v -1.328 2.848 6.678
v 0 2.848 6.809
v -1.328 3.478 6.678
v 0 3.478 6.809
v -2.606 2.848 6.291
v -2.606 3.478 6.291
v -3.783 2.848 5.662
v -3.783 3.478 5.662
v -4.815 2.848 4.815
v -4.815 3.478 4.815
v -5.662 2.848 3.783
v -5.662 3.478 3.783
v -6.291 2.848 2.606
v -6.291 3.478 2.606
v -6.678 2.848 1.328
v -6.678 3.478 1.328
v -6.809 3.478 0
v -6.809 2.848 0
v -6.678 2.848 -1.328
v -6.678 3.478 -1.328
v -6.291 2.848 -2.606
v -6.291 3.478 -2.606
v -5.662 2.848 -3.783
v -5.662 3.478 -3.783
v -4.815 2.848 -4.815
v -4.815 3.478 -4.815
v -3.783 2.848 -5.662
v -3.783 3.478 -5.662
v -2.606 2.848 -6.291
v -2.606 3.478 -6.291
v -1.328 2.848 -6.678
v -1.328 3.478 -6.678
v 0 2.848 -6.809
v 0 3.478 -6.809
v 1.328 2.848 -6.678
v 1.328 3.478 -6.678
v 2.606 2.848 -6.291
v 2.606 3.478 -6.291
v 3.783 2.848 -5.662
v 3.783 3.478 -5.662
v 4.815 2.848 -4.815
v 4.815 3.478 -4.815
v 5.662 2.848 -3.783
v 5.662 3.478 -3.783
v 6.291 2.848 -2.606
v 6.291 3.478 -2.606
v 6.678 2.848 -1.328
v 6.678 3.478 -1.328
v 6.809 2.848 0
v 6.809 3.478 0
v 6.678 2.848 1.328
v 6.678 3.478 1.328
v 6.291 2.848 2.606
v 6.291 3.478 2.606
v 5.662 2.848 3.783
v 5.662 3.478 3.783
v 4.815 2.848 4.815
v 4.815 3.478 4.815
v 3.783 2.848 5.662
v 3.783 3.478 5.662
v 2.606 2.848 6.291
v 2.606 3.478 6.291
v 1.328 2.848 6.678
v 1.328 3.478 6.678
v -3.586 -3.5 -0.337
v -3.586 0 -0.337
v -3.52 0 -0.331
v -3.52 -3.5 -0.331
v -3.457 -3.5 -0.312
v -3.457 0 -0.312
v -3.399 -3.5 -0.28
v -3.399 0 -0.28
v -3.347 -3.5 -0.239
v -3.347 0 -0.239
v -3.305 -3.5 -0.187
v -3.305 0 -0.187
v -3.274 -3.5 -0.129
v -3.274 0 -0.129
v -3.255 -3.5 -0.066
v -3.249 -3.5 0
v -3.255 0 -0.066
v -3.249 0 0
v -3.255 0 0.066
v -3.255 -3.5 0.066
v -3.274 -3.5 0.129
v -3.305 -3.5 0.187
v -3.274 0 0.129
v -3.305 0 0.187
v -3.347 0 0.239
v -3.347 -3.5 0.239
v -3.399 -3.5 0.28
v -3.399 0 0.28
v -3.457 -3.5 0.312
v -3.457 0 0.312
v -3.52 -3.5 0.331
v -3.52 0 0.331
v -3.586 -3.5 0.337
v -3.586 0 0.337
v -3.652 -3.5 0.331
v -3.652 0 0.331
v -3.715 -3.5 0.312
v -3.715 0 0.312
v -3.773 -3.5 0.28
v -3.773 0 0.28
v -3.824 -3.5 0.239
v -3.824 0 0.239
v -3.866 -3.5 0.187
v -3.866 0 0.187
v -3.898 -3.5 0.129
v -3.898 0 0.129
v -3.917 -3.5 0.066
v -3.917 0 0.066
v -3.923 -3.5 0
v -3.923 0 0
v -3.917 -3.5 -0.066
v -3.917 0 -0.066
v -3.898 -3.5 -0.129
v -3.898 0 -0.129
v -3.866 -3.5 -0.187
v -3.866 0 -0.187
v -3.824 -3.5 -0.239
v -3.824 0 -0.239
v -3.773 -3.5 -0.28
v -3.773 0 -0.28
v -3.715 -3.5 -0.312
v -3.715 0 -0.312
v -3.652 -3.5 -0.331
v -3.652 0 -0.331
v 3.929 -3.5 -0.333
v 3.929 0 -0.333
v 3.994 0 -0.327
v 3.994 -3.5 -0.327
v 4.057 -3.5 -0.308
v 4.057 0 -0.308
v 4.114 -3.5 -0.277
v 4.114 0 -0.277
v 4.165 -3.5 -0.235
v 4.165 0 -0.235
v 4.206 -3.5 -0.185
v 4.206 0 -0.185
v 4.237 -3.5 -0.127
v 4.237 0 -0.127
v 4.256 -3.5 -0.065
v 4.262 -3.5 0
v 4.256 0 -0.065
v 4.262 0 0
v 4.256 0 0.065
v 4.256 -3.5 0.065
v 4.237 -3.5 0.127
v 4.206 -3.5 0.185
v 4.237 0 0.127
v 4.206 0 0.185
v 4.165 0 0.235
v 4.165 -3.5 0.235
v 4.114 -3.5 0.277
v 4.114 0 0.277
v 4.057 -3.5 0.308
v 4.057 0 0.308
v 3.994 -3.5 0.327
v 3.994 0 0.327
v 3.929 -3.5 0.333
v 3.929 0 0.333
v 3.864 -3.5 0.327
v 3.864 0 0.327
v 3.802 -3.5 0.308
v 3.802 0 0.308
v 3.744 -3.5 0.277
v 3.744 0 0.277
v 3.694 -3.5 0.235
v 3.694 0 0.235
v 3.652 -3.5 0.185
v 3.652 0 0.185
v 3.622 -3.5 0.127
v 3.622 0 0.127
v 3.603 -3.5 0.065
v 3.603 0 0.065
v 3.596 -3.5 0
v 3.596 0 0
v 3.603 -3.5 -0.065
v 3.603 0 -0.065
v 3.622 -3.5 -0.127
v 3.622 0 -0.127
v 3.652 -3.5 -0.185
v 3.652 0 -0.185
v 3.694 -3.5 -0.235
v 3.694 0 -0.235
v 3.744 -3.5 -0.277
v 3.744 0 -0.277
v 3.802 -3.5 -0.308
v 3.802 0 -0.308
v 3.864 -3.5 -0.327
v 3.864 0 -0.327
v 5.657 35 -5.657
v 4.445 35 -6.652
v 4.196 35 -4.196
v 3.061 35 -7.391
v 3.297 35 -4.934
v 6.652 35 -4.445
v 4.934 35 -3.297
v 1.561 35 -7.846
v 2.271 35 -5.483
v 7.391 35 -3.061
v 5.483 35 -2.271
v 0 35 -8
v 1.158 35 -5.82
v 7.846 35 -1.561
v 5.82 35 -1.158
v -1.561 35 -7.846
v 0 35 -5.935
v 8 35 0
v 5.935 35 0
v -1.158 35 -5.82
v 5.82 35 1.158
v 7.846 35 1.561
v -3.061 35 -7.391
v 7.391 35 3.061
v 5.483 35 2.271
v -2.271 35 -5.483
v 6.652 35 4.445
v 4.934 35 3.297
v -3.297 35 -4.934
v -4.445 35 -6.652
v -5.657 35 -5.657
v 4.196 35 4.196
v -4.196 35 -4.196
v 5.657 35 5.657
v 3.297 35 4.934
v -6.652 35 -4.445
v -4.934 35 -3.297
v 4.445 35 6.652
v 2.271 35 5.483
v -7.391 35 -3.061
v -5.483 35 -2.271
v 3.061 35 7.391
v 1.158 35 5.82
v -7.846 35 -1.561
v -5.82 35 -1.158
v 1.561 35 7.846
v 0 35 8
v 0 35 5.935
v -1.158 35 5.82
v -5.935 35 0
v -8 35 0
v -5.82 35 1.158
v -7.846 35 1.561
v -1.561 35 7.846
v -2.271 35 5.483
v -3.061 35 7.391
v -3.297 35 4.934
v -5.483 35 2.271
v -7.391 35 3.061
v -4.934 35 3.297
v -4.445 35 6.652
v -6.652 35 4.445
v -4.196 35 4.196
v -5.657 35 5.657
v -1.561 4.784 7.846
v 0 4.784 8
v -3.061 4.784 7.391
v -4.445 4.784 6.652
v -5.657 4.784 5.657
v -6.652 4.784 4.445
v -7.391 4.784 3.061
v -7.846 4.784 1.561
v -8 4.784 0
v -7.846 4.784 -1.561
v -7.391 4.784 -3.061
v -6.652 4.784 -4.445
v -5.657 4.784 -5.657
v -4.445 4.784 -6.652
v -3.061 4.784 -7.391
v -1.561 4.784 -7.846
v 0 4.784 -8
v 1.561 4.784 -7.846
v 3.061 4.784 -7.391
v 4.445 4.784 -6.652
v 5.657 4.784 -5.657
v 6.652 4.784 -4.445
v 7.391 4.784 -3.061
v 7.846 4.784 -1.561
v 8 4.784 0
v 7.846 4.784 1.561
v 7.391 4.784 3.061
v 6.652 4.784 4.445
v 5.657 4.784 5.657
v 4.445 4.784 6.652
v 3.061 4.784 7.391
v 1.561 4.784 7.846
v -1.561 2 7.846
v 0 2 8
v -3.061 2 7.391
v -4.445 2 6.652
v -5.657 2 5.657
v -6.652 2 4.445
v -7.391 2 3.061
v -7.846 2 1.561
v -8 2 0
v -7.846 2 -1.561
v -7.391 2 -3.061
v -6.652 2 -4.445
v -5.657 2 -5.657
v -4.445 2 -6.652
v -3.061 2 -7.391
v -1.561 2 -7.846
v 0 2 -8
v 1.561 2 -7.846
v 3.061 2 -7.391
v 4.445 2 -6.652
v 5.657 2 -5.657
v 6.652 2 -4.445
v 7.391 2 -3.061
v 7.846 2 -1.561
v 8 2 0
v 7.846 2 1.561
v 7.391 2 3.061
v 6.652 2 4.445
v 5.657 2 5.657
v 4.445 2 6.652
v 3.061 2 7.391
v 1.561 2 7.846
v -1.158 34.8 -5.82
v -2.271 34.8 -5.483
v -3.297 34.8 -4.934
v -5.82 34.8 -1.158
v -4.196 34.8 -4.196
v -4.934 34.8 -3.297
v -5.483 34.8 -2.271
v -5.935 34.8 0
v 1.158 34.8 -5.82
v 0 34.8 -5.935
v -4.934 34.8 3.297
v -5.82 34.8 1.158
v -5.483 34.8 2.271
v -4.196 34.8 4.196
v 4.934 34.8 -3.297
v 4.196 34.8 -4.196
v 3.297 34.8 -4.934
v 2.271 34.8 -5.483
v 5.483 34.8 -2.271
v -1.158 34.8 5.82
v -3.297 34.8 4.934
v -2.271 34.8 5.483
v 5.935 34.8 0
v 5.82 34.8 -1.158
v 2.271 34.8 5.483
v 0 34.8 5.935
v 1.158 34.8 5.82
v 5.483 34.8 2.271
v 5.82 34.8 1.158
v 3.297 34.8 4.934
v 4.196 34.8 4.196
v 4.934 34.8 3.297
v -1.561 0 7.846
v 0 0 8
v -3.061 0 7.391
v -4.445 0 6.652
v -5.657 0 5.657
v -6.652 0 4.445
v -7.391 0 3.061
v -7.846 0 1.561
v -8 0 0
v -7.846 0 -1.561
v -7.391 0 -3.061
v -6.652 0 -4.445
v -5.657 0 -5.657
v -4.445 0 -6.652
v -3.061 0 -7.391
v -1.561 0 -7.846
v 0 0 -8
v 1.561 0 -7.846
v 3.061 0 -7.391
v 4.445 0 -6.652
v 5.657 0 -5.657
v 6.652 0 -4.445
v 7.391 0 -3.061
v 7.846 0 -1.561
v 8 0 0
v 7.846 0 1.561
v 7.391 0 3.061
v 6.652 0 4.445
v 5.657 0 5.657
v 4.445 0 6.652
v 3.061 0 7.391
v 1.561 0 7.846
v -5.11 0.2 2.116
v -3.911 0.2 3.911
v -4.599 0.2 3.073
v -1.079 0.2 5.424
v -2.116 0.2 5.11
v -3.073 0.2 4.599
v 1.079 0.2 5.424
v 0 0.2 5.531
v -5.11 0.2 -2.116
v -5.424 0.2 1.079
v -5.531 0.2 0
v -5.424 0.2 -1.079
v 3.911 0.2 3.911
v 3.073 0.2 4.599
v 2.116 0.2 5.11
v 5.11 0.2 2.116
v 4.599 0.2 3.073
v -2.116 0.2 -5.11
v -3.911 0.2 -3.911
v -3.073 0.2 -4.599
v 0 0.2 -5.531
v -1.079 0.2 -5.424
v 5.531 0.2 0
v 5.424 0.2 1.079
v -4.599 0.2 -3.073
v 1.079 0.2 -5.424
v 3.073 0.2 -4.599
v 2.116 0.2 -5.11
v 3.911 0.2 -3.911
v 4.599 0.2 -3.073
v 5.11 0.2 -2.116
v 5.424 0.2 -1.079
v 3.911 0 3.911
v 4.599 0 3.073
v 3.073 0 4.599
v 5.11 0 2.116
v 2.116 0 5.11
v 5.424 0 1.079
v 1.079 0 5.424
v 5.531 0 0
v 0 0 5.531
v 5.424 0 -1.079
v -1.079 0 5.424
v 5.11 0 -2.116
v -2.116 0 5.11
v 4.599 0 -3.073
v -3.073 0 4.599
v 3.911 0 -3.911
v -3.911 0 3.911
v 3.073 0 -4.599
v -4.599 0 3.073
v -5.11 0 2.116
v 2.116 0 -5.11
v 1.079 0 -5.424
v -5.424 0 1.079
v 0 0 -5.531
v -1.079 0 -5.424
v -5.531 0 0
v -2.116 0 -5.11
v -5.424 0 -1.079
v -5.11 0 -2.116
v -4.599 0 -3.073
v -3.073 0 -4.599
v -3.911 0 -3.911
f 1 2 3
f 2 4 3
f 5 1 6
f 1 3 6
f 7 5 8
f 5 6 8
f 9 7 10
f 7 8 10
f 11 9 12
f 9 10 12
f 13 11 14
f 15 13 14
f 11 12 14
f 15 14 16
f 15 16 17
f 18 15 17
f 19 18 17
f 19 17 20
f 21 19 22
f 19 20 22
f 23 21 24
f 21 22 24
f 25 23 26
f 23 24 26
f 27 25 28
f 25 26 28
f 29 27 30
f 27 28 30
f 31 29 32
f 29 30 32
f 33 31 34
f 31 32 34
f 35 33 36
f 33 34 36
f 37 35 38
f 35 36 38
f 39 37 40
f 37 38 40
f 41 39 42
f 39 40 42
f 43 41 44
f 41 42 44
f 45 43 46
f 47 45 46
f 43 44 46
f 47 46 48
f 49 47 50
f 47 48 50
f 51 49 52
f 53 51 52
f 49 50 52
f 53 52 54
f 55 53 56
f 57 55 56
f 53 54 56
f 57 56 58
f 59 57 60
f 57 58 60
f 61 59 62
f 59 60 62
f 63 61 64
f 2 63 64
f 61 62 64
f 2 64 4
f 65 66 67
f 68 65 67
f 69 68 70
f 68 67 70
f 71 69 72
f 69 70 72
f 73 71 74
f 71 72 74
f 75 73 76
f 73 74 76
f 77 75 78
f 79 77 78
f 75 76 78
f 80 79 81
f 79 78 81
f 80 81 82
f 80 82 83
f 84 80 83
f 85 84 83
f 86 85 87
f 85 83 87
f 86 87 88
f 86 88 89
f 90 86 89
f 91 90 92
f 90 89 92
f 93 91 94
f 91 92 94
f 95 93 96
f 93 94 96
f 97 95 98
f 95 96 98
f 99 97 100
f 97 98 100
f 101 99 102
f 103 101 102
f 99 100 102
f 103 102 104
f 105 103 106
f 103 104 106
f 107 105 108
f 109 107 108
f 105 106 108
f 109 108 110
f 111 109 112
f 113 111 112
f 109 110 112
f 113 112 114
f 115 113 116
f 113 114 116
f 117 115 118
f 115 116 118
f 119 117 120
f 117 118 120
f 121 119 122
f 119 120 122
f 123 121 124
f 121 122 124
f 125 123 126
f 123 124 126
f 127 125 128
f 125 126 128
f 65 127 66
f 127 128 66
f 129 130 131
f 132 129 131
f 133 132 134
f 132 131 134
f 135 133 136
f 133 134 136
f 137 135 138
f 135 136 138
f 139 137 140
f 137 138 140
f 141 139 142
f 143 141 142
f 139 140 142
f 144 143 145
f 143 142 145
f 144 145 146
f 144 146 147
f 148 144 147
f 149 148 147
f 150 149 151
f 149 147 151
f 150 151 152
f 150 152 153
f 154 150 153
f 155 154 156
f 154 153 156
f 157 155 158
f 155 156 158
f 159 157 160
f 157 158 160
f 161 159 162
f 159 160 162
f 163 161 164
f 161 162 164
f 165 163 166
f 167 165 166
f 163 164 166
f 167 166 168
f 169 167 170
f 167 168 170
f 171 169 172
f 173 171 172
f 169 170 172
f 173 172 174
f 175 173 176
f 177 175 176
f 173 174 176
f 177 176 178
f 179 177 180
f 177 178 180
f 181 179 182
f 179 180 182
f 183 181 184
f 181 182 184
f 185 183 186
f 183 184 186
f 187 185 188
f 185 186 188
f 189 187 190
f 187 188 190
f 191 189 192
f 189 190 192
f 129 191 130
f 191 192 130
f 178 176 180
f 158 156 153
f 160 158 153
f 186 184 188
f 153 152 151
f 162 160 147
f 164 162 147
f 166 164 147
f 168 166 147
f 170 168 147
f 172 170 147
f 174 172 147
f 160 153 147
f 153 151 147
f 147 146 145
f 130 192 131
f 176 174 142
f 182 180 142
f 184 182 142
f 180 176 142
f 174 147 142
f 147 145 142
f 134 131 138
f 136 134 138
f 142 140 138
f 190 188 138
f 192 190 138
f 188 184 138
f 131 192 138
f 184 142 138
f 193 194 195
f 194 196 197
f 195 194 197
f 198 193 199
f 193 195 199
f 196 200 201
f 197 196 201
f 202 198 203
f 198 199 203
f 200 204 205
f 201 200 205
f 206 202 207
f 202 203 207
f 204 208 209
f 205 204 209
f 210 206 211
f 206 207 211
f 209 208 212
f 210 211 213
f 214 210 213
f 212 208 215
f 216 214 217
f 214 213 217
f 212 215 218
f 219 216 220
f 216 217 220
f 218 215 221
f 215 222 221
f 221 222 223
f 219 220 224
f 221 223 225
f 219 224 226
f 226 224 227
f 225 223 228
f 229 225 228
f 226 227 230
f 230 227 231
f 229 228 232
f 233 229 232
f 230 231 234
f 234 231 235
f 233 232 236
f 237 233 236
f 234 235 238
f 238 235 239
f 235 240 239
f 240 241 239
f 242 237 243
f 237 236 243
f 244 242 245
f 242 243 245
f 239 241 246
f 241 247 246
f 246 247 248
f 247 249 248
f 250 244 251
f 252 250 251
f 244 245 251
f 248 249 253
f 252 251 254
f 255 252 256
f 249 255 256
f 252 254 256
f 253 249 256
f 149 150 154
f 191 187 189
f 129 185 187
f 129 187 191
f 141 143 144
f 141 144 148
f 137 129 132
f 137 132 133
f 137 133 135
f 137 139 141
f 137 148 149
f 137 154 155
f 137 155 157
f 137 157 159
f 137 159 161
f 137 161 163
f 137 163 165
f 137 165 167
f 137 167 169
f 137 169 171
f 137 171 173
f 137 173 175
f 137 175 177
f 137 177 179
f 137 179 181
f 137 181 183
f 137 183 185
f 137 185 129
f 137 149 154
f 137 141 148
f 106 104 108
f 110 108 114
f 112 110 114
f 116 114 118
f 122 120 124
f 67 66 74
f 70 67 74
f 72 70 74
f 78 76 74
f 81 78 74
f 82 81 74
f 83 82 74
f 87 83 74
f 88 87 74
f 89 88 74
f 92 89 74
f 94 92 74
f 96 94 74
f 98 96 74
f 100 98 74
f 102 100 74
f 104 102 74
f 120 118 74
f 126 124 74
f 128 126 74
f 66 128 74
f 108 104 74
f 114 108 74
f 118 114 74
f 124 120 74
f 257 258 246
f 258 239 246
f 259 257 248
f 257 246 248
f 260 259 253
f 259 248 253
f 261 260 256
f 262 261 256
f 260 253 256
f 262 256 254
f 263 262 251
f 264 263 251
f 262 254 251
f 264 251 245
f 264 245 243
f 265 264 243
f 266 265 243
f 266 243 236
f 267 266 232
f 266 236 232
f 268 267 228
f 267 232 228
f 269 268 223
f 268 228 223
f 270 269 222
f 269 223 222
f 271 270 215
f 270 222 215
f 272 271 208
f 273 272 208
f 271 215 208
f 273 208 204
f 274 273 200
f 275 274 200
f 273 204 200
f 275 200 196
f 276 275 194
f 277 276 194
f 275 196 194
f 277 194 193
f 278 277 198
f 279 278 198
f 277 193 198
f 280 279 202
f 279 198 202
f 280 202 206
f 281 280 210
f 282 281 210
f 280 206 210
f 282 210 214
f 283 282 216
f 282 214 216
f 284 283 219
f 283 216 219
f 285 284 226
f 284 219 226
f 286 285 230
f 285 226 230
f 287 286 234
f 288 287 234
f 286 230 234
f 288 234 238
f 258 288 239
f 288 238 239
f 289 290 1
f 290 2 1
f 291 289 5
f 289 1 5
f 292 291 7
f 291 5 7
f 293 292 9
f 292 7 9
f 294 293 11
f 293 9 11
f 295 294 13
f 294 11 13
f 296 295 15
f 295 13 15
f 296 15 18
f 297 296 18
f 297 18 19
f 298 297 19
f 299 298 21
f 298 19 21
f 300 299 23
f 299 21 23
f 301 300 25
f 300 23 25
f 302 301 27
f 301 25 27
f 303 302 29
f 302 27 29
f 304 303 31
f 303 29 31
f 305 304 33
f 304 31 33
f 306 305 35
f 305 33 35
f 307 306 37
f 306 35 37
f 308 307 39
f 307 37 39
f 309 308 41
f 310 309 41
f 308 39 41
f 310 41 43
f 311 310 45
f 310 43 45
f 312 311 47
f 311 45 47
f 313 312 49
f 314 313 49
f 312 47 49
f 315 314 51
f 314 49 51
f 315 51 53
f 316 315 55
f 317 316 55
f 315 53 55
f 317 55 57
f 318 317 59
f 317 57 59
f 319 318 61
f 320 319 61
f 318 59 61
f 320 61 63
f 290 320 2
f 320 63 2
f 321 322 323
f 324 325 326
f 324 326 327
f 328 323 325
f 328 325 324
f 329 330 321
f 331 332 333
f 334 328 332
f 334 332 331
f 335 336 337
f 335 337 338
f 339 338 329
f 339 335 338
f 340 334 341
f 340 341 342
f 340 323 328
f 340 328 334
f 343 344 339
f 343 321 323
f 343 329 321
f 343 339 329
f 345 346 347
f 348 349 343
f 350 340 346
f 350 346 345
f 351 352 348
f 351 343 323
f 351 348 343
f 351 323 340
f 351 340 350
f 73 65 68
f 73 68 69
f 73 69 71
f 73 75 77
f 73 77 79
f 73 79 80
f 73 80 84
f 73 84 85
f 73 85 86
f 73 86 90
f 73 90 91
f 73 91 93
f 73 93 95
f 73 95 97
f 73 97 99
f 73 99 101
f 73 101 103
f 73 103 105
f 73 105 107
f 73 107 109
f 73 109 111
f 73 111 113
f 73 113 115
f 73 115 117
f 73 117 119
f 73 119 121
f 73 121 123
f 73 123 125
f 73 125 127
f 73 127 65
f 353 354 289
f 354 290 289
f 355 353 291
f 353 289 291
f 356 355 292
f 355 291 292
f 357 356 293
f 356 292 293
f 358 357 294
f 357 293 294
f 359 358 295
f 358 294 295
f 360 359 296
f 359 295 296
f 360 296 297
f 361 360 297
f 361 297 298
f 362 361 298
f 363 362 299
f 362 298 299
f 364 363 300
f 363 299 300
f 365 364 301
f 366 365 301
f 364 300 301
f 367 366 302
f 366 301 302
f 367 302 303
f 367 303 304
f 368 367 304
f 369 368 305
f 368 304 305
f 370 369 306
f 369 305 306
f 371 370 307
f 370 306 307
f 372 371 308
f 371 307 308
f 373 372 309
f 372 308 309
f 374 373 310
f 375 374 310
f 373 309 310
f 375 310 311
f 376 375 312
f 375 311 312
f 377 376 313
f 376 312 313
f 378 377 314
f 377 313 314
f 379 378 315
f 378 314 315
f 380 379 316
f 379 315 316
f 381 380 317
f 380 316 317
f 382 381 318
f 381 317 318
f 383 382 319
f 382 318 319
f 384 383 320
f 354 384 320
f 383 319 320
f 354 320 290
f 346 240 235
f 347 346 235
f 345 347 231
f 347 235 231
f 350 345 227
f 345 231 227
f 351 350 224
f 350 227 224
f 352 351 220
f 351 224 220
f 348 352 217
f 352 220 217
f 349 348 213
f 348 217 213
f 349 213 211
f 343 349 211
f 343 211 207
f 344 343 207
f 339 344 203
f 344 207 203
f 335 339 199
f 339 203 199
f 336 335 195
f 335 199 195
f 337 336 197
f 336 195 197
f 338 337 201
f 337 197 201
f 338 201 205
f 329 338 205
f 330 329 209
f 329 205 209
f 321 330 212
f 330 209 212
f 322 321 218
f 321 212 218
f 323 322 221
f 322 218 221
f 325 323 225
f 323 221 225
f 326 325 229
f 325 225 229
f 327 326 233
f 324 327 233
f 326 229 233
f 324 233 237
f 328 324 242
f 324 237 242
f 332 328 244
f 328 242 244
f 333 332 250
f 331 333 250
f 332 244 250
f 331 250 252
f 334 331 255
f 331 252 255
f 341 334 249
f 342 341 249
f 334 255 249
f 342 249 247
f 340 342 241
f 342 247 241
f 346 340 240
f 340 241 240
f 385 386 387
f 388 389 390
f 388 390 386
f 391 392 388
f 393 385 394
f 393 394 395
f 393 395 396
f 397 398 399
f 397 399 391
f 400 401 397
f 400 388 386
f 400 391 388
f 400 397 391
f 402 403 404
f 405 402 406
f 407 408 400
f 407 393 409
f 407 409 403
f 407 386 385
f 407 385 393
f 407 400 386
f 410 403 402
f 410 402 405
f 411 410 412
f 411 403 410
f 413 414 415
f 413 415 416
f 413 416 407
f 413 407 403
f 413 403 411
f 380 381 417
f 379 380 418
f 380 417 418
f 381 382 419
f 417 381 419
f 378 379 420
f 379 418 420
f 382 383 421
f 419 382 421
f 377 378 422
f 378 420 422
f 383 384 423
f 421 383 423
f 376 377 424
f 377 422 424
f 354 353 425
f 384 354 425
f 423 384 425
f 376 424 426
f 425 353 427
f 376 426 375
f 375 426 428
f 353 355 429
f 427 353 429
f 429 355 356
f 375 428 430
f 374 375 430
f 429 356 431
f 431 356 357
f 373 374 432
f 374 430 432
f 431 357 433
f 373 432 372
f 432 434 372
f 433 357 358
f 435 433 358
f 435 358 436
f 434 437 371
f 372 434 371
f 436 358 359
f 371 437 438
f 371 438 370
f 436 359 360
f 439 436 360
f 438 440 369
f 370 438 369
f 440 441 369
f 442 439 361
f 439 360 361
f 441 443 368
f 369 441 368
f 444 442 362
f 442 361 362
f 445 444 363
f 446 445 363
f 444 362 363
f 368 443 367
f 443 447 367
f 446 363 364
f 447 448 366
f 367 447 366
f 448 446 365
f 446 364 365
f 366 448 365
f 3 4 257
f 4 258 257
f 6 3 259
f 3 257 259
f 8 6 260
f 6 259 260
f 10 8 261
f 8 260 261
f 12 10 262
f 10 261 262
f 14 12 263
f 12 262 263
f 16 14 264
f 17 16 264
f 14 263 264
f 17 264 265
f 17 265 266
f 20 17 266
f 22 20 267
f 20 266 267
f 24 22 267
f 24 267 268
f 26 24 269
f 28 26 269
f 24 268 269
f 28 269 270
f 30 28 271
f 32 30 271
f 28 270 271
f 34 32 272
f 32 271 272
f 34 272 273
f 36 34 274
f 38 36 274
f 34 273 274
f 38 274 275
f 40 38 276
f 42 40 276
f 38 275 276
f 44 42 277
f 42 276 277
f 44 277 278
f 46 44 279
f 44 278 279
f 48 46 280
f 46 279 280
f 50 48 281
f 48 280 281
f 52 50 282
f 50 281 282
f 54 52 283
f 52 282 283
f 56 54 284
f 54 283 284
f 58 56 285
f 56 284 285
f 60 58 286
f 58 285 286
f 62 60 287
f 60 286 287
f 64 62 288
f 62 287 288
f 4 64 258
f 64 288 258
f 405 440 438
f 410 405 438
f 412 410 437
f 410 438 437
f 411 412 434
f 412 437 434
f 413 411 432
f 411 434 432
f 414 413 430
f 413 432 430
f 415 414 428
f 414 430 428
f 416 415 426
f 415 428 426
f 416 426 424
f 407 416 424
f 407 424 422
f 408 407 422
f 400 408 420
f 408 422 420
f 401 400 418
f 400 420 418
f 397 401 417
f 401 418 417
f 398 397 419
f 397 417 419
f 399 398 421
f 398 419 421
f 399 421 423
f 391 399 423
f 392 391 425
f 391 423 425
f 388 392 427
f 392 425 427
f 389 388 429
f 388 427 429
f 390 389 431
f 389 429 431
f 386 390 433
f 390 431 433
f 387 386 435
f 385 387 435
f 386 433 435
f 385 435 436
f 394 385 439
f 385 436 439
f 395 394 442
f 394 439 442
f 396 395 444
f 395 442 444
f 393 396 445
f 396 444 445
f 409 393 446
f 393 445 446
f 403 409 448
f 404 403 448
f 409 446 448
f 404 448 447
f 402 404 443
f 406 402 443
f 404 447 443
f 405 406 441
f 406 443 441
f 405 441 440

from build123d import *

# Parameters (mm, degrees)
SKETCH_2_R          = 0.337317786
SKETCH_2_R_2        = 0.332910614
EXTRUDE_1_DEPTH     = 3.5
SKETCH_3_R          = 5.93451457
CUT_EXTRUDE_1_DEPTH = 0.2
SKETCH_4_R          = 5.530592895
CUT_EXTRUDE_2_DEPTH = 0.2


with BuildPart() as part:
    # 草图1 → 旋转1 (revolve)
    with BuildSketch(Plane.XY, mode=Mode.PRIVATE) as revolve_1_sk:
        Polygon((0, 0), (-8, 0), (-8, 2), (-6.809071375, 2.84756708), (-6.809071375, 3.478415102), (-8, 4.78410207), (-8, 35), (0, 35), align=None)
    revolve(revolve_1_sk.sketch.rotate(Axis((0, 10.427265959, 0), (0, -1, 0)), 270), axis=Axis((0, 10.427265959, 0), (0, -1, 0)))

    # 草图2 → 凸台-拉伸1 (add)
    with BuildSketch(Plane.XZ):
        with Locations(Location((-3.585921992, 0, 0), (0, 0, 270))):
            Circle(SKETCH_2_R)
        with Locations(Location((3.929204485, 0, 0), (0, 0, 270))):
            Circle(SKETCH_2_R_2)
    extrude(amount=EXTRUDE_1_DEPTH)

    # 草图3 → 切除-拉伸1 (cut)
    with BuildSketch(Plane(origin=(0, 35, 0), x_dir=(1, 0, 0), z_dir=(0, 1, 0))):
        with Locations(Location((0, 0, 0), (0, 0, 270))):
            Circle(SKETCH_3_R)
    extrude(amount=-CUT_EXTRUDE_1_DEPTH, mode=Mode.SUBTRACT)

    # 草图4 → 切除-拉伸2 (cut)
    with BuildSketch(Plane.XZ):
        with Locations(Location((0, 0, 0), (0, 0, 270))):
            Circle(SKETCH_4_R)
    extrude(amount=-CUT_EXTRUDE_2_DEPTH, mode=Mode.SUBTRACT)


with BuildPart() as cut_extrude_2_piece_1:
    # of the separate pieces the step leaves, piece 1, a body of its own (cut_extrude_2_pieces)
    add(part.part.solids().sort_by_distance((0, 0, 8))[0])


with BuildPart() as cut_extrude_2_piece_2:
    # of the separate pieces the step leaves, piece 2, a body of its own (cut_extrude_2_pieces)
    add(part.part.solids().sort_by_distance((-3.585921992, 0, -0.337317786))[0])


with BuildPart() as cut_extrude_2_piece_3:
    # of the separate pieces the step leaves, piece 3, a body of its own (cut_extrude_2_pieces)
    add(part.part.solids().sort_by_distance((3.929204485, 0, -0.332910614))[0])


solid = Compound([cut_extrude_2_piece_1.part, cut_extrude_2_piece_2.part, cut_extrude_2_piece_3.part])
